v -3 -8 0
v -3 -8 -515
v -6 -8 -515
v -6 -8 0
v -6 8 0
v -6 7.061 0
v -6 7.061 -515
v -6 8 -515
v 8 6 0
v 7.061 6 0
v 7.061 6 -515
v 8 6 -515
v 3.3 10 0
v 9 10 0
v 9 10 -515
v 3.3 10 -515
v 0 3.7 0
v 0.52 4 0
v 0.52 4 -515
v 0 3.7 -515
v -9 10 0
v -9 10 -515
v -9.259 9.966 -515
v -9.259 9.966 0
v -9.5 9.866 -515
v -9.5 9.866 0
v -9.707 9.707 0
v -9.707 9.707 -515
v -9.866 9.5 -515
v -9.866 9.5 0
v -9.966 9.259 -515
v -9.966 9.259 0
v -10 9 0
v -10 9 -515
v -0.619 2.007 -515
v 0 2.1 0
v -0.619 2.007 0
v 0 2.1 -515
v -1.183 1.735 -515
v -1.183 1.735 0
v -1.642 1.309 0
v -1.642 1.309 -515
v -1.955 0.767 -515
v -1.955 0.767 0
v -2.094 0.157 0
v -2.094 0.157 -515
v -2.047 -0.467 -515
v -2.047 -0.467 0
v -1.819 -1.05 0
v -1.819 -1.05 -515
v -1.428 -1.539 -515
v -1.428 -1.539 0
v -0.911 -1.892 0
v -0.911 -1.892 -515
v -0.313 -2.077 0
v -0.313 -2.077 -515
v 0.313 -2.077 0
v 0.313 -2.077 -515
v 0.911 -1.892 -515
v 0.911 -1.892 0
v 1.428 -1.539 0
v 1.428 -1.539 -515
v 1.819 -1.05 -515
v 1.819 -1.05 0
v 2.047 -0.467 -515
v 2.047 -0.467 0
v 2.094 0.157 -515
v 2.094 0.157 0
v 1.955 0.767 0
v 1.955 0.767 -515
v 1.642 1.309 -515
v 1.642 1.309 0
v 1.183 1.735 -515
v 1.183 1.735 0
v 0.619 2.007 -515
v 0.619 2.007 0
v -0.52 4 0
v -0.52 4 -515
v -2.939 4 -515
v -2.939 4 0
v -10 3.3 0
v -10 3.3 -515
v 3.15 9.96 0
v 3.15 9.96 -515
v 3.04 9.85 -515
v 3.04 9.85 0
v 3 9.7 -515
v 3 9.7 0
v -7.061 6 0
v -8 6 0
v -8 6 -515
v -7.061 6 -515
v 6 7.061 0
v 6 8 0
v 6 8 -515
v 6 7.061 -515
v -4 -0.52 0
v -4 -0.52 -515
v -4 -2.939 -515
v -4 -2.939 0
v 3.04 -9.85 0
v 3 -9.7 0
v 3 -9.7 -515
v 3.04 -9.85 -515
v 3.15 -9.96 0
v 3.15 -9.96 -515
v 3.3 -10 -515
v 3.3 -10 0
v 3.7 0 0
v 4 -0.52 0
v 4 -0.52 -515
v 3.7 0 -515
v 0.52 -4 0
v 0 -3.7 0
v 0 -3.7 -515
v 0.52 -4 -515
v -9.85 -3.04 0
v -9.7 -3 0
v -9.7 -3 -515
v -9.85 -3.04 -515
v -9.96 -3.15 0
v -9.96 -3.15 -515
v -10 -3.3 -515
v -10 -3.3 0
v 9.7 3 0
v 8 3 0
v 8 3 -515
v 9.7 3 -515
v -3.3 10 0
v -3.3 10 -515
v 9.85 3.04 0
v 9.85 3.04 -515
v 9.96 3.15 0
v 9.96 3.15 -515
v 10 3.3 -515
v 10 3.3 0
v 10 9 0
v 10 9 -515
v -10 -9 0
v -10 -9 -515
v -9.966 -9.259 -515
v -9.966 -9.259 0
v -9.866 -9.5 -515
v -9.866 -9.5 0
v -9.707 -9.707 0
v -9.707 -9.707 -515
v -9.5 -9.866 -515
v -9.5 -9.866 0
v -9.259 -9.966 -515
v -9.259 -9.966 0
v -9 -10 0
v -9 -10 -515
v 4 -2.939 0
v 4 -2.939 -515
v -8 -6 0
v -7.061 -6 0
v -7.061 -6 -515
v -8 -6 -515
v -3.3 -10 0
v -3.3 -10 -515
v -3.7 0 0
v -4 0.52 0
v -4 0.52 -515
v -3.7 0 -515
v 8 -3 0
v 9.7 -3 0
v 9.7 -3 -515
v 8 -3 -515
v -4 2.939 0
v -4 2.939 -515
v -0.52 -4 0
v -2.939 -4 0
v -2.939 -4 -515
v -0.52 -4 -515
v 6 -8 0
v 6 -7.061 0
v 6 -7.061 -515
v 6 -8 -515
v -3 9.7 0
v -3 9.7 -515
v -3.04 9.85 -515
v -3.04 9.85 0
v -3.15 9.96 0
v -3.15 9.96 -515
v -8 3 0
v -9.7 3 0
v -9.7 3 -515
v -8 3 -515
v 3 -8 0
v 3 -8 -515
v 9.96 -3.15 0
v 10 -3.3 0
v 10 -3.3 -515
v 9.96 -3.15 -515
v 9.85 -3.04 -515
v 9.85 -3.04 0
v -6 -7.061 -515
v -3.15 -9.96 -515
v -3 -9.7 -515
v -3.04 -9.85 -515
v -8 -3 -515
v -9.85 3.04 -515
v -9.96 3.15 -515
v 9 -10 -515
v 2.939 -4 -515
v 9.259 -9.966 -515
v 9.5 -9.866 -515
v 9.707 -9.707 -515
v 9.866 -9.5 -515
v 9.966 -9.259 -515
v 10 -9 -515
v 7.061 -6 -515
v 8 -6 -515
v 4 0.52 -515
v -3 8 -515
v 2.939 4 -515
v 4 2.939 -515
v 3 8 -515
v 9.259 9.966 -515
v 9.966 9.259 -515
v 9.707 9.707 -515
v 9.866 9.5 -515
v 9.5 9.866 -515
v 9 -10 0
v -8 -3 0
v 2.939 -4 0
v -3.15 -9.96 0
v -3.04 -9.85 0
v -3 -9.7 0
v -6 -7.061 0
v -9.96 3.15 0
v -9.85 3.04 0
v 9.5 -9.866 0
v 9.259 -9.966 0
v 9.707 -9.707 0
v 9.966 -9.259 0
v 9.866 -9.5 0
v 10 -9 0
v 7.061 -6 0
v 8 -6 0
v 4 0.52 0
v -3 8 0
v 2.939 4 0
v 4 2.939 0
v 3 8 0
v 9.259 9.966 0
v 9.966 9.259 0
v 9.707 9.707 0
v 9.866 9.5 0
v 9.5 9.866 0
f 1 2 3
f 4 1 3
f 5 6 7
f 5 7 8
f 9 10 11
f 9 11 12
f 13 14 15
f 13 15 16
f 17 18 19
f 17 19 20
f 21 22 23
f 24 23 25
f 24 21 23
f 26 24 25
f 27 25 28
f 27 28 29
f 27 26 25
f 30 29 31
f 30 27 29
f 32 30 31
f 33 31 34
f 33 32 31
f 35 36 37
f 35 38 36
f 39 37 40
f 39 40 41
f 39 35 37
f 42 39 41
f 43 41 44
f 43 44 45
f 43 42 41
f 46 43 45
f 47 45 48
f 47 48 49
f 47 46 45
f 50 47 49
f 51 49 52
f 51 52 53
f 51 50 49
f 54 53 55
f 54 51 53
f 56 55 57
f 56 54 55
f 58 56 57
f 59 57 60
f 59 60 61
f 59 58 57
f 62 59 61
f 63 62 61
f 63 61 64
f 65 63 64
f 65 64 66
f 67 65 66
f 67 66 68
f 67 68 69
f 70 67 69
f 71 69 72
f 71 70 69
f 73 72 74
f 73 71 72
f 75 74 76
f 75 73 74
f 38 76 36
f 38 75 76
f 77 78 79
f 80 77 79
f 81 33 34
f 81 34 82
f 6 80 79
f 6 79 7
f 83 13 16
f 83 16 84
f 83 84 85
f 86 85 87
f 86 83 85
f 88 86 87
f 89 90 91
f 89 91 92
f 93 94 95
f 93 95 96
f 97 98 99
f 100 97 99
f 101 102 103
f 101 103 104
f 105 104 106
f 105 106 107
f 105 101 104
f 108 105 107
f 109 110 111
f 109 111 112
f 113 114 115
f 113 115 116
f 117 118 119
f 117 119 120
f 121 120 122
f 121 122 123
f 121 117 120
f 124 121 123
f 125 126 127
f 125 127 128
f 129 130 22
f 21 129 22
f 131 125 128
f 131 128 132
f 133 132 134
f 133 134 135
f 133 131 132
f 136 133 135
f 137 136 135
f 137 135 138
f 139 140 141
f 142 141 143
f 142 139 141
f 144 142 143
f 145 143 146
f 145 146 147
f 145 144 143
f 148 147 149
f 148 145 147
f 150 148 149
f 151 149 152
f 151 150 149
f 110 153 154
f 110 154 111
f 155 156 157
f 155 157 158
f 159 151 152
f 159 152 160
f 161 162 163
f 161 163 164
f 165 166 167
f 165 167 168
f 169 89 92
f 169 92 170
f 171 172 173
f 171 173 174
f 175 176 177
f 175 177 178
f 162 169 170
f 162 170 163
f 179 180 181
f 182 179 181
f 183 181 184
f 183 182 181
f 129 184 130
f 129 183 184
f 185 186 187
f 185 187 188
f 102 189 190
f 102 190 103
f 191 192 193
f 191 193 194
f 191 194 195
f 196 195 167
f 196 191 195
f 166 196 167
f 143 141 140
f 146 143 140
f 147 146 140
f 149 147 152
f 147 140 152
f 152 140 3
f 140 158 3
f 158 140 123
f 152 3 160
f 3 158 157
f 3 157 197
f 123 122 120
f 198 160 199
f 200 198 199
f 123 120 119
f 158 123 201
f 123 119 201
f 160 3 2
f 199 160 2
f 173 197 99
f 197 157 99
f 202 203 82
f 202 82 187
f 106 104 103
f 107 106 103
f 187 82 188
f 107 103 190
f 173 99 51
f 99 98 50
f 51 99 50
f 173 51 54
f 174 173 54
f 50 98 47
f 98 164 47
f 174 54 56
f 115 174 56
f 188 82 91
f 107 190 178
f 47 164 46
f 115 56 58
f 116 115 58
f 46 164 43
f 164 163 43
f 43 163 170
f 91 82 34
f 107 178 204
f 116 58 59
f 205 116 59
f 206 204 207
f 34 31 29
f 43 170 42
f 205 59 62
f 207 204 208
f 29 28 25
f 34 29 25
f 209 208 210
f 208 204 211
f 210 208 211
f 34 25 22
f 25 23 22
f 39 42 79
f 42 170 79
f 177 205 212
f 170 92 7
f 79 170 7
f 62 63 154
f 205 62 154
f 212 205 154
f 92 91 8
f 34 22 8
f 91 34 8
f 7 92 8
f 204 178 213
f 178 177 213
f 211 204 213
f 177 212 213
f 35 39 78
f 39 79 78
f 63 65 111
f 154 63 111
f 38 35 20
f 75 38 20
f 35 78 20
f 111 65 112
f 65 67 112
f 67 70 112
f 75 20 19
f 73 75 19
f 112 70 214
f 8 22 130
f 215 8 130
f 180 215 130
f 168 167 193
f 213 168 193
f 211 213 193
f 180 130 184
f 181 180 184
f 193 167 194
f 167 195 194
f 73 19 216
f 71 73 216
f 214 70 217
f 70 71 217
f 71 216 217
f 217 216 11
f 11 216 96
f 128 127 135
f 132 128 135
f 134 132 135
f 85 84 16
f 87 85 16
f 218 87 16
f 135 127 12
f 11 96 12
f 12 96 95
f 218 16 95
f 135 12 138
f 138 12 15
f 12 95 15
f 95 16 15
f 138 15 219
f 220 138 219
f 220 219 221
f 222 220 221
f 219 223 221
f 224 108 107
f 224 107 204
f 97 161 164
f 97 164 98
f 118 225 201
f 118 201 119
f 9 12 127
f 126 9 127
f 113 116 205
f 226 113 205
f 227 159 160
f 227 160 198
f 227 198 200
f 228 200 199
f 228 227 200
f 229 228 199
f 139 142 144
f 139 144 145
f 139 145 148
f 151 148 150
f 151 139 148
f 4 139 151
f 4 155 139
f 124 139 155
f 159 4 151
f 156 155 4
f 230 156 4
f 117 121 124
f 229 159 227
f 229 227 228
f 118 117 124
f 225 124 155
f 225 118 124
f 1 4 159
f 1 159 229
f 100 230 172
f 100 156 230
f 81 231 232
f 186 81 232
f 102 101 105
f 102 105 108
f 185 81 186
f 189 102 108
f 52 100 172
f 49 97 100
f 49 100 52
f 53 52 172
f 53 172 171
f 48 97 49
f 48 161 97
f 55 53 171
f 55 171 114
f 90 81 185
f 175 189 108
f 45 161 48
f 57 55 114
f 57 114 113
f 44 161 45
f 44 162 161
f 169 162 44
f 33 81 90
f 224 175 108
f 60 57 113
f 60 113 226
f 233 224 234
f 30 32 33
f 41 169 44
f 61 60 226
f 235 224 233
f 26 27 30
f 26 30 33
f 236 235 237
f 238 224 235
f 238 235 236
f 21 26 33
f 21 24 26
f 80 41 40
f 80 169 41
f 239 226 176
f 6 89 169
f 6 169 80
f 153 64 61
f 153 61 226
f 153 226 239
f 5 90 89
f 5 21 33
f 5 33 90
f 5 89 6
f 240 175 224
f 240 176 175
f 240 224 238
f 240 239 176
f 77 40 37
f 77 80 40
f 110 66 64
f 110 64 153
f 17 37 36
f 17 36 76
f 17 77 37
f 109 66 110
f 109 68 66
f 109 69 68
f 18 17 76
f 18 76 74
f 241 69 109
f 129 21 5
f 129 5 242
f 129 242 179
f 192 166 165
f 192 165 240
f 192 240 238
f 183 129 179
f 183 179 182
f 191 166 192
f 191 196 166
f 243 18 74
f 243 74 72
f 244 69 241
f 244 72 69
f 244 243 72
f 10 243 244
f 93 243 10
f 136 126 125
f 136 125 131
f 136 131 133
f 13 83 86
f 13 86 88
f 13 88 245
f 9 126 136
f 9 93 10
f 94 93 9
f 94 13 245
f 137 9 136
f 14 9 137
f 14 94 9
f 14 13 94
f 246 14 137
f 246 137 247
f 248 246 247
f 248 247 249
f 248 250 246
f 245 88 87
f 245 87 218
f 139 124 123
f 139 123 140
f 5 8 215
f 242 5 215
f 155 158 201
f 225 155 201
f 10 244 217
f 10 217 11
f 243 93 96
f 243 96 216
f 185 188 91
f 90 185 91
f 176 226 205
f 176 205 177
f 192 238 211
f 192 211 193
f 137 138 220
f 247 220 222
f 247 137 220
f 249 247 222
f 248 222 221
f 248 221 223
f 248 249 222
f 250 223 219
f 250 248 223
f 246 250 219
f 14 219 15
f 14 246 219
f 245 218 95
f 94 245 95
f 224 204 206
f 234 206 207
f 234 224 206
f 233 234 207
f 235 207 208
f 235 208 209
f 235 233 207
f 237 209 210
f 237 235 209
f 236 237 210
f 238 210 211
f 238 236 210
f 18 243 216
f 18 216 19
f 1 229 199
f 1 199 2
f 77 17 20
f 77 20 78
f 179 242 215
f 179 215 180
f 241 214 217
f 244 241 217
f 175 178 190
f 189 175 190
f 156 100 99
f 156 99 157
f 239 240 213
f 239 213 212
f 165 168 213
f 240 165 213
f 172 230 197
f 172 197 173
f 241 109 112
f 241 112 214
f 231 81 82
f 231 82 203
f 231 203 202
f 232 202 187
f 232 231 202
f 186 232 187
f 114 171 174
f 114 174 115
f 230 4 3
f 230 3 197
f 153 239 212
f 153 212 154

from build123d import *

# Parameters (mm, degrees)
BOSS_EXTRUDE1_DEPTH = 515
SKETCH2_W           = 515
SKETCH2_H           = 2.1


with BuildPart() as part:
    # Sketch1 → Boss-Extrude1 (new body)
    with BuildSketch(Plane.XY):
        with BuildLine():
            Line((-10, 9), (-10, 3.29999995))
            ThreePointArc((-10, 3.29999995), (-9.912132049, 3.087867916), (-9.7, 3))
            Line((-9.7, 3), (-8, 3))
            Line((-8, 3), (-8, 6))
            Line((-8, 6), (-7.060677, 6))
            Line((-7.060677, 6), (-4, 2.93932965))
            Line((-4, 2.93932965), (-4, 0.519615242))
            Line((-4, 0.519615242), (-3.699996283, -6.437e-06))
            Line((-3.699996283, -6.437e-06), (-4, -0.519628117))
            Line((-4, -0.519628117), (-4, -2.93933725))
            Line((-4, -2.93933725), (-7.0606695, -6))
            Line((-7.0606695, -6), (-8, -6))
            Line((-8, -6), (-8, -3))
            Line((-8, -3), (-9.7, -3))
            ThreePointArc((-9.7, -3), (-9.912132049, -3.087867916), (-10, -3.29999995))
            Line((-10, -3.29999995), (-10, -9))
            ThreePointArc((-10, -9), (-9.707106781, -9.707106781), (-9, -10))
            Line((-9, -10), (-3.29999995, -10))
            ThreePointArc((-3.29999995, -10), (-3.087867916, -9.912132049), (-3, -9.7))
            Line((-3, -9.7), (-3, -8))
            Line((-3, -8), (-6, -8))
            Line((-6, -8), (-6, -7.0606515))
            Line((-6, -7.0606515), (-2.9393489, -4))
            Line((-2.9393489, -4), (-0.519615242, -4))
            Line((-0.519615242, -4), (6.437e-06, -3.699996283))
            Line((6.437e-06, -3.699996283), (0.519628117, -4))
            Line((0.519628117, -4), (2.9393227, -4))
            Line((2.9393227, -4), (6, -7.060677))
            Line((6, -7.060677), (6, -8))
            Line((6, -8), (3, -8))
            Line((3, -8), (3, -9.7))
            ThreePointArc((3, -9.7), (3.087867916, -9.912132049), (3.29999995, -10))
            Line((3.29999995, -10), (9, -10))
            ThreePointArc((9, -10), (9.707106781, -9.707106781), (10, -9))
            Line((10, -9), (10, -3.29999995))
            ThreePointArc((10, -3.29999995), (9.912132049, -3.087867916), (9.7, -3))
            Line((9.7, -3), (8, -3))
            Line((8, -3), (8, -6))
            Line((8, -6), (7.0606435, -6))
            Line((7.0606435, -6), (4, -2.9393482))
            Line((4, -2.9393482), (4, -0.519615242))
            Line((4, -0.519615242), (3.699996283, 6.437e-06))
            Line((3.699996283, 6.437e-06), (4, 0.519628117))
            Line((4, 0.519628117), (4, 2.9393401))
            Line((4, 2.9393401), (7.060651, 6))
            Line((7.060651, 6), (8, 6))
            Line((8, 6), (8, 3))
            Line((8, 3), (9.7, 3))
            ThreePointArc((9.7, 3), (9.912132049, 3.087867916), (10, 3.29999995))
            Line((10, 3.29999995), (10, 9))
            ThreePointArc((10, 9), (9.707106781, 9.707106781), (9, 10))
            Line((9, 10), (3.29999995, 10))
            ThreePointArc((3.29999995, 10), (3.087867916, 9.912132049), (3, 9.7))
            Line((3, 9.7), (3, 8))
            Line((3, 8), (6, 8))
            Line((6, 8), (6, 7.060669))
            Line((6, 7.060669), (2.9393308, 4))
            Line((2.9393308, 4), (0.519615242, 4))
            Line((0.519615242, 4), (-6.437e-06, 3.699996283))
            Line((-6.437e-06, 3.699996283), (-0.519628117, 4))
            Line((-0.519628117, 4), (-2.93935655, 4))
            Line((-2.93935655, 4), (-6, 7.0606435))
            Line((-6, 7.0606435), (-6, 8))
            Line((-6, 8), (-3, 8))
            Line((-3, 8), (-3, 9.7))
            ThreePointArc((-3, 9.7), (-3.087867966, 9.912132034), (-3.3, 10))
            Line((-3.3, 10), (-9, 10))
            ThreePointArc((-9, 10), (-9.707106781, 9.707106781), (-10, 9))
        make_face()
    extrude(amount=-BOSS_EXTRUDE1_DEPTH)

    # Sketch2 → Cut-Revolve1 (revolve, cut)
    with BuildSketch(Plane(origin=(0, 0, 0), x_dir=(0, 0, -1), z_dir=(1, 0, 0))):
        with Locations((257.5, 1.05)):
            Rectangle(SKETCH2_W, SKETCH2_H)
    revolve(axis=Axis((0, 0, -515), (0, 0, 1)), mode=Mode.SUBTRACT)


solid = part.part
